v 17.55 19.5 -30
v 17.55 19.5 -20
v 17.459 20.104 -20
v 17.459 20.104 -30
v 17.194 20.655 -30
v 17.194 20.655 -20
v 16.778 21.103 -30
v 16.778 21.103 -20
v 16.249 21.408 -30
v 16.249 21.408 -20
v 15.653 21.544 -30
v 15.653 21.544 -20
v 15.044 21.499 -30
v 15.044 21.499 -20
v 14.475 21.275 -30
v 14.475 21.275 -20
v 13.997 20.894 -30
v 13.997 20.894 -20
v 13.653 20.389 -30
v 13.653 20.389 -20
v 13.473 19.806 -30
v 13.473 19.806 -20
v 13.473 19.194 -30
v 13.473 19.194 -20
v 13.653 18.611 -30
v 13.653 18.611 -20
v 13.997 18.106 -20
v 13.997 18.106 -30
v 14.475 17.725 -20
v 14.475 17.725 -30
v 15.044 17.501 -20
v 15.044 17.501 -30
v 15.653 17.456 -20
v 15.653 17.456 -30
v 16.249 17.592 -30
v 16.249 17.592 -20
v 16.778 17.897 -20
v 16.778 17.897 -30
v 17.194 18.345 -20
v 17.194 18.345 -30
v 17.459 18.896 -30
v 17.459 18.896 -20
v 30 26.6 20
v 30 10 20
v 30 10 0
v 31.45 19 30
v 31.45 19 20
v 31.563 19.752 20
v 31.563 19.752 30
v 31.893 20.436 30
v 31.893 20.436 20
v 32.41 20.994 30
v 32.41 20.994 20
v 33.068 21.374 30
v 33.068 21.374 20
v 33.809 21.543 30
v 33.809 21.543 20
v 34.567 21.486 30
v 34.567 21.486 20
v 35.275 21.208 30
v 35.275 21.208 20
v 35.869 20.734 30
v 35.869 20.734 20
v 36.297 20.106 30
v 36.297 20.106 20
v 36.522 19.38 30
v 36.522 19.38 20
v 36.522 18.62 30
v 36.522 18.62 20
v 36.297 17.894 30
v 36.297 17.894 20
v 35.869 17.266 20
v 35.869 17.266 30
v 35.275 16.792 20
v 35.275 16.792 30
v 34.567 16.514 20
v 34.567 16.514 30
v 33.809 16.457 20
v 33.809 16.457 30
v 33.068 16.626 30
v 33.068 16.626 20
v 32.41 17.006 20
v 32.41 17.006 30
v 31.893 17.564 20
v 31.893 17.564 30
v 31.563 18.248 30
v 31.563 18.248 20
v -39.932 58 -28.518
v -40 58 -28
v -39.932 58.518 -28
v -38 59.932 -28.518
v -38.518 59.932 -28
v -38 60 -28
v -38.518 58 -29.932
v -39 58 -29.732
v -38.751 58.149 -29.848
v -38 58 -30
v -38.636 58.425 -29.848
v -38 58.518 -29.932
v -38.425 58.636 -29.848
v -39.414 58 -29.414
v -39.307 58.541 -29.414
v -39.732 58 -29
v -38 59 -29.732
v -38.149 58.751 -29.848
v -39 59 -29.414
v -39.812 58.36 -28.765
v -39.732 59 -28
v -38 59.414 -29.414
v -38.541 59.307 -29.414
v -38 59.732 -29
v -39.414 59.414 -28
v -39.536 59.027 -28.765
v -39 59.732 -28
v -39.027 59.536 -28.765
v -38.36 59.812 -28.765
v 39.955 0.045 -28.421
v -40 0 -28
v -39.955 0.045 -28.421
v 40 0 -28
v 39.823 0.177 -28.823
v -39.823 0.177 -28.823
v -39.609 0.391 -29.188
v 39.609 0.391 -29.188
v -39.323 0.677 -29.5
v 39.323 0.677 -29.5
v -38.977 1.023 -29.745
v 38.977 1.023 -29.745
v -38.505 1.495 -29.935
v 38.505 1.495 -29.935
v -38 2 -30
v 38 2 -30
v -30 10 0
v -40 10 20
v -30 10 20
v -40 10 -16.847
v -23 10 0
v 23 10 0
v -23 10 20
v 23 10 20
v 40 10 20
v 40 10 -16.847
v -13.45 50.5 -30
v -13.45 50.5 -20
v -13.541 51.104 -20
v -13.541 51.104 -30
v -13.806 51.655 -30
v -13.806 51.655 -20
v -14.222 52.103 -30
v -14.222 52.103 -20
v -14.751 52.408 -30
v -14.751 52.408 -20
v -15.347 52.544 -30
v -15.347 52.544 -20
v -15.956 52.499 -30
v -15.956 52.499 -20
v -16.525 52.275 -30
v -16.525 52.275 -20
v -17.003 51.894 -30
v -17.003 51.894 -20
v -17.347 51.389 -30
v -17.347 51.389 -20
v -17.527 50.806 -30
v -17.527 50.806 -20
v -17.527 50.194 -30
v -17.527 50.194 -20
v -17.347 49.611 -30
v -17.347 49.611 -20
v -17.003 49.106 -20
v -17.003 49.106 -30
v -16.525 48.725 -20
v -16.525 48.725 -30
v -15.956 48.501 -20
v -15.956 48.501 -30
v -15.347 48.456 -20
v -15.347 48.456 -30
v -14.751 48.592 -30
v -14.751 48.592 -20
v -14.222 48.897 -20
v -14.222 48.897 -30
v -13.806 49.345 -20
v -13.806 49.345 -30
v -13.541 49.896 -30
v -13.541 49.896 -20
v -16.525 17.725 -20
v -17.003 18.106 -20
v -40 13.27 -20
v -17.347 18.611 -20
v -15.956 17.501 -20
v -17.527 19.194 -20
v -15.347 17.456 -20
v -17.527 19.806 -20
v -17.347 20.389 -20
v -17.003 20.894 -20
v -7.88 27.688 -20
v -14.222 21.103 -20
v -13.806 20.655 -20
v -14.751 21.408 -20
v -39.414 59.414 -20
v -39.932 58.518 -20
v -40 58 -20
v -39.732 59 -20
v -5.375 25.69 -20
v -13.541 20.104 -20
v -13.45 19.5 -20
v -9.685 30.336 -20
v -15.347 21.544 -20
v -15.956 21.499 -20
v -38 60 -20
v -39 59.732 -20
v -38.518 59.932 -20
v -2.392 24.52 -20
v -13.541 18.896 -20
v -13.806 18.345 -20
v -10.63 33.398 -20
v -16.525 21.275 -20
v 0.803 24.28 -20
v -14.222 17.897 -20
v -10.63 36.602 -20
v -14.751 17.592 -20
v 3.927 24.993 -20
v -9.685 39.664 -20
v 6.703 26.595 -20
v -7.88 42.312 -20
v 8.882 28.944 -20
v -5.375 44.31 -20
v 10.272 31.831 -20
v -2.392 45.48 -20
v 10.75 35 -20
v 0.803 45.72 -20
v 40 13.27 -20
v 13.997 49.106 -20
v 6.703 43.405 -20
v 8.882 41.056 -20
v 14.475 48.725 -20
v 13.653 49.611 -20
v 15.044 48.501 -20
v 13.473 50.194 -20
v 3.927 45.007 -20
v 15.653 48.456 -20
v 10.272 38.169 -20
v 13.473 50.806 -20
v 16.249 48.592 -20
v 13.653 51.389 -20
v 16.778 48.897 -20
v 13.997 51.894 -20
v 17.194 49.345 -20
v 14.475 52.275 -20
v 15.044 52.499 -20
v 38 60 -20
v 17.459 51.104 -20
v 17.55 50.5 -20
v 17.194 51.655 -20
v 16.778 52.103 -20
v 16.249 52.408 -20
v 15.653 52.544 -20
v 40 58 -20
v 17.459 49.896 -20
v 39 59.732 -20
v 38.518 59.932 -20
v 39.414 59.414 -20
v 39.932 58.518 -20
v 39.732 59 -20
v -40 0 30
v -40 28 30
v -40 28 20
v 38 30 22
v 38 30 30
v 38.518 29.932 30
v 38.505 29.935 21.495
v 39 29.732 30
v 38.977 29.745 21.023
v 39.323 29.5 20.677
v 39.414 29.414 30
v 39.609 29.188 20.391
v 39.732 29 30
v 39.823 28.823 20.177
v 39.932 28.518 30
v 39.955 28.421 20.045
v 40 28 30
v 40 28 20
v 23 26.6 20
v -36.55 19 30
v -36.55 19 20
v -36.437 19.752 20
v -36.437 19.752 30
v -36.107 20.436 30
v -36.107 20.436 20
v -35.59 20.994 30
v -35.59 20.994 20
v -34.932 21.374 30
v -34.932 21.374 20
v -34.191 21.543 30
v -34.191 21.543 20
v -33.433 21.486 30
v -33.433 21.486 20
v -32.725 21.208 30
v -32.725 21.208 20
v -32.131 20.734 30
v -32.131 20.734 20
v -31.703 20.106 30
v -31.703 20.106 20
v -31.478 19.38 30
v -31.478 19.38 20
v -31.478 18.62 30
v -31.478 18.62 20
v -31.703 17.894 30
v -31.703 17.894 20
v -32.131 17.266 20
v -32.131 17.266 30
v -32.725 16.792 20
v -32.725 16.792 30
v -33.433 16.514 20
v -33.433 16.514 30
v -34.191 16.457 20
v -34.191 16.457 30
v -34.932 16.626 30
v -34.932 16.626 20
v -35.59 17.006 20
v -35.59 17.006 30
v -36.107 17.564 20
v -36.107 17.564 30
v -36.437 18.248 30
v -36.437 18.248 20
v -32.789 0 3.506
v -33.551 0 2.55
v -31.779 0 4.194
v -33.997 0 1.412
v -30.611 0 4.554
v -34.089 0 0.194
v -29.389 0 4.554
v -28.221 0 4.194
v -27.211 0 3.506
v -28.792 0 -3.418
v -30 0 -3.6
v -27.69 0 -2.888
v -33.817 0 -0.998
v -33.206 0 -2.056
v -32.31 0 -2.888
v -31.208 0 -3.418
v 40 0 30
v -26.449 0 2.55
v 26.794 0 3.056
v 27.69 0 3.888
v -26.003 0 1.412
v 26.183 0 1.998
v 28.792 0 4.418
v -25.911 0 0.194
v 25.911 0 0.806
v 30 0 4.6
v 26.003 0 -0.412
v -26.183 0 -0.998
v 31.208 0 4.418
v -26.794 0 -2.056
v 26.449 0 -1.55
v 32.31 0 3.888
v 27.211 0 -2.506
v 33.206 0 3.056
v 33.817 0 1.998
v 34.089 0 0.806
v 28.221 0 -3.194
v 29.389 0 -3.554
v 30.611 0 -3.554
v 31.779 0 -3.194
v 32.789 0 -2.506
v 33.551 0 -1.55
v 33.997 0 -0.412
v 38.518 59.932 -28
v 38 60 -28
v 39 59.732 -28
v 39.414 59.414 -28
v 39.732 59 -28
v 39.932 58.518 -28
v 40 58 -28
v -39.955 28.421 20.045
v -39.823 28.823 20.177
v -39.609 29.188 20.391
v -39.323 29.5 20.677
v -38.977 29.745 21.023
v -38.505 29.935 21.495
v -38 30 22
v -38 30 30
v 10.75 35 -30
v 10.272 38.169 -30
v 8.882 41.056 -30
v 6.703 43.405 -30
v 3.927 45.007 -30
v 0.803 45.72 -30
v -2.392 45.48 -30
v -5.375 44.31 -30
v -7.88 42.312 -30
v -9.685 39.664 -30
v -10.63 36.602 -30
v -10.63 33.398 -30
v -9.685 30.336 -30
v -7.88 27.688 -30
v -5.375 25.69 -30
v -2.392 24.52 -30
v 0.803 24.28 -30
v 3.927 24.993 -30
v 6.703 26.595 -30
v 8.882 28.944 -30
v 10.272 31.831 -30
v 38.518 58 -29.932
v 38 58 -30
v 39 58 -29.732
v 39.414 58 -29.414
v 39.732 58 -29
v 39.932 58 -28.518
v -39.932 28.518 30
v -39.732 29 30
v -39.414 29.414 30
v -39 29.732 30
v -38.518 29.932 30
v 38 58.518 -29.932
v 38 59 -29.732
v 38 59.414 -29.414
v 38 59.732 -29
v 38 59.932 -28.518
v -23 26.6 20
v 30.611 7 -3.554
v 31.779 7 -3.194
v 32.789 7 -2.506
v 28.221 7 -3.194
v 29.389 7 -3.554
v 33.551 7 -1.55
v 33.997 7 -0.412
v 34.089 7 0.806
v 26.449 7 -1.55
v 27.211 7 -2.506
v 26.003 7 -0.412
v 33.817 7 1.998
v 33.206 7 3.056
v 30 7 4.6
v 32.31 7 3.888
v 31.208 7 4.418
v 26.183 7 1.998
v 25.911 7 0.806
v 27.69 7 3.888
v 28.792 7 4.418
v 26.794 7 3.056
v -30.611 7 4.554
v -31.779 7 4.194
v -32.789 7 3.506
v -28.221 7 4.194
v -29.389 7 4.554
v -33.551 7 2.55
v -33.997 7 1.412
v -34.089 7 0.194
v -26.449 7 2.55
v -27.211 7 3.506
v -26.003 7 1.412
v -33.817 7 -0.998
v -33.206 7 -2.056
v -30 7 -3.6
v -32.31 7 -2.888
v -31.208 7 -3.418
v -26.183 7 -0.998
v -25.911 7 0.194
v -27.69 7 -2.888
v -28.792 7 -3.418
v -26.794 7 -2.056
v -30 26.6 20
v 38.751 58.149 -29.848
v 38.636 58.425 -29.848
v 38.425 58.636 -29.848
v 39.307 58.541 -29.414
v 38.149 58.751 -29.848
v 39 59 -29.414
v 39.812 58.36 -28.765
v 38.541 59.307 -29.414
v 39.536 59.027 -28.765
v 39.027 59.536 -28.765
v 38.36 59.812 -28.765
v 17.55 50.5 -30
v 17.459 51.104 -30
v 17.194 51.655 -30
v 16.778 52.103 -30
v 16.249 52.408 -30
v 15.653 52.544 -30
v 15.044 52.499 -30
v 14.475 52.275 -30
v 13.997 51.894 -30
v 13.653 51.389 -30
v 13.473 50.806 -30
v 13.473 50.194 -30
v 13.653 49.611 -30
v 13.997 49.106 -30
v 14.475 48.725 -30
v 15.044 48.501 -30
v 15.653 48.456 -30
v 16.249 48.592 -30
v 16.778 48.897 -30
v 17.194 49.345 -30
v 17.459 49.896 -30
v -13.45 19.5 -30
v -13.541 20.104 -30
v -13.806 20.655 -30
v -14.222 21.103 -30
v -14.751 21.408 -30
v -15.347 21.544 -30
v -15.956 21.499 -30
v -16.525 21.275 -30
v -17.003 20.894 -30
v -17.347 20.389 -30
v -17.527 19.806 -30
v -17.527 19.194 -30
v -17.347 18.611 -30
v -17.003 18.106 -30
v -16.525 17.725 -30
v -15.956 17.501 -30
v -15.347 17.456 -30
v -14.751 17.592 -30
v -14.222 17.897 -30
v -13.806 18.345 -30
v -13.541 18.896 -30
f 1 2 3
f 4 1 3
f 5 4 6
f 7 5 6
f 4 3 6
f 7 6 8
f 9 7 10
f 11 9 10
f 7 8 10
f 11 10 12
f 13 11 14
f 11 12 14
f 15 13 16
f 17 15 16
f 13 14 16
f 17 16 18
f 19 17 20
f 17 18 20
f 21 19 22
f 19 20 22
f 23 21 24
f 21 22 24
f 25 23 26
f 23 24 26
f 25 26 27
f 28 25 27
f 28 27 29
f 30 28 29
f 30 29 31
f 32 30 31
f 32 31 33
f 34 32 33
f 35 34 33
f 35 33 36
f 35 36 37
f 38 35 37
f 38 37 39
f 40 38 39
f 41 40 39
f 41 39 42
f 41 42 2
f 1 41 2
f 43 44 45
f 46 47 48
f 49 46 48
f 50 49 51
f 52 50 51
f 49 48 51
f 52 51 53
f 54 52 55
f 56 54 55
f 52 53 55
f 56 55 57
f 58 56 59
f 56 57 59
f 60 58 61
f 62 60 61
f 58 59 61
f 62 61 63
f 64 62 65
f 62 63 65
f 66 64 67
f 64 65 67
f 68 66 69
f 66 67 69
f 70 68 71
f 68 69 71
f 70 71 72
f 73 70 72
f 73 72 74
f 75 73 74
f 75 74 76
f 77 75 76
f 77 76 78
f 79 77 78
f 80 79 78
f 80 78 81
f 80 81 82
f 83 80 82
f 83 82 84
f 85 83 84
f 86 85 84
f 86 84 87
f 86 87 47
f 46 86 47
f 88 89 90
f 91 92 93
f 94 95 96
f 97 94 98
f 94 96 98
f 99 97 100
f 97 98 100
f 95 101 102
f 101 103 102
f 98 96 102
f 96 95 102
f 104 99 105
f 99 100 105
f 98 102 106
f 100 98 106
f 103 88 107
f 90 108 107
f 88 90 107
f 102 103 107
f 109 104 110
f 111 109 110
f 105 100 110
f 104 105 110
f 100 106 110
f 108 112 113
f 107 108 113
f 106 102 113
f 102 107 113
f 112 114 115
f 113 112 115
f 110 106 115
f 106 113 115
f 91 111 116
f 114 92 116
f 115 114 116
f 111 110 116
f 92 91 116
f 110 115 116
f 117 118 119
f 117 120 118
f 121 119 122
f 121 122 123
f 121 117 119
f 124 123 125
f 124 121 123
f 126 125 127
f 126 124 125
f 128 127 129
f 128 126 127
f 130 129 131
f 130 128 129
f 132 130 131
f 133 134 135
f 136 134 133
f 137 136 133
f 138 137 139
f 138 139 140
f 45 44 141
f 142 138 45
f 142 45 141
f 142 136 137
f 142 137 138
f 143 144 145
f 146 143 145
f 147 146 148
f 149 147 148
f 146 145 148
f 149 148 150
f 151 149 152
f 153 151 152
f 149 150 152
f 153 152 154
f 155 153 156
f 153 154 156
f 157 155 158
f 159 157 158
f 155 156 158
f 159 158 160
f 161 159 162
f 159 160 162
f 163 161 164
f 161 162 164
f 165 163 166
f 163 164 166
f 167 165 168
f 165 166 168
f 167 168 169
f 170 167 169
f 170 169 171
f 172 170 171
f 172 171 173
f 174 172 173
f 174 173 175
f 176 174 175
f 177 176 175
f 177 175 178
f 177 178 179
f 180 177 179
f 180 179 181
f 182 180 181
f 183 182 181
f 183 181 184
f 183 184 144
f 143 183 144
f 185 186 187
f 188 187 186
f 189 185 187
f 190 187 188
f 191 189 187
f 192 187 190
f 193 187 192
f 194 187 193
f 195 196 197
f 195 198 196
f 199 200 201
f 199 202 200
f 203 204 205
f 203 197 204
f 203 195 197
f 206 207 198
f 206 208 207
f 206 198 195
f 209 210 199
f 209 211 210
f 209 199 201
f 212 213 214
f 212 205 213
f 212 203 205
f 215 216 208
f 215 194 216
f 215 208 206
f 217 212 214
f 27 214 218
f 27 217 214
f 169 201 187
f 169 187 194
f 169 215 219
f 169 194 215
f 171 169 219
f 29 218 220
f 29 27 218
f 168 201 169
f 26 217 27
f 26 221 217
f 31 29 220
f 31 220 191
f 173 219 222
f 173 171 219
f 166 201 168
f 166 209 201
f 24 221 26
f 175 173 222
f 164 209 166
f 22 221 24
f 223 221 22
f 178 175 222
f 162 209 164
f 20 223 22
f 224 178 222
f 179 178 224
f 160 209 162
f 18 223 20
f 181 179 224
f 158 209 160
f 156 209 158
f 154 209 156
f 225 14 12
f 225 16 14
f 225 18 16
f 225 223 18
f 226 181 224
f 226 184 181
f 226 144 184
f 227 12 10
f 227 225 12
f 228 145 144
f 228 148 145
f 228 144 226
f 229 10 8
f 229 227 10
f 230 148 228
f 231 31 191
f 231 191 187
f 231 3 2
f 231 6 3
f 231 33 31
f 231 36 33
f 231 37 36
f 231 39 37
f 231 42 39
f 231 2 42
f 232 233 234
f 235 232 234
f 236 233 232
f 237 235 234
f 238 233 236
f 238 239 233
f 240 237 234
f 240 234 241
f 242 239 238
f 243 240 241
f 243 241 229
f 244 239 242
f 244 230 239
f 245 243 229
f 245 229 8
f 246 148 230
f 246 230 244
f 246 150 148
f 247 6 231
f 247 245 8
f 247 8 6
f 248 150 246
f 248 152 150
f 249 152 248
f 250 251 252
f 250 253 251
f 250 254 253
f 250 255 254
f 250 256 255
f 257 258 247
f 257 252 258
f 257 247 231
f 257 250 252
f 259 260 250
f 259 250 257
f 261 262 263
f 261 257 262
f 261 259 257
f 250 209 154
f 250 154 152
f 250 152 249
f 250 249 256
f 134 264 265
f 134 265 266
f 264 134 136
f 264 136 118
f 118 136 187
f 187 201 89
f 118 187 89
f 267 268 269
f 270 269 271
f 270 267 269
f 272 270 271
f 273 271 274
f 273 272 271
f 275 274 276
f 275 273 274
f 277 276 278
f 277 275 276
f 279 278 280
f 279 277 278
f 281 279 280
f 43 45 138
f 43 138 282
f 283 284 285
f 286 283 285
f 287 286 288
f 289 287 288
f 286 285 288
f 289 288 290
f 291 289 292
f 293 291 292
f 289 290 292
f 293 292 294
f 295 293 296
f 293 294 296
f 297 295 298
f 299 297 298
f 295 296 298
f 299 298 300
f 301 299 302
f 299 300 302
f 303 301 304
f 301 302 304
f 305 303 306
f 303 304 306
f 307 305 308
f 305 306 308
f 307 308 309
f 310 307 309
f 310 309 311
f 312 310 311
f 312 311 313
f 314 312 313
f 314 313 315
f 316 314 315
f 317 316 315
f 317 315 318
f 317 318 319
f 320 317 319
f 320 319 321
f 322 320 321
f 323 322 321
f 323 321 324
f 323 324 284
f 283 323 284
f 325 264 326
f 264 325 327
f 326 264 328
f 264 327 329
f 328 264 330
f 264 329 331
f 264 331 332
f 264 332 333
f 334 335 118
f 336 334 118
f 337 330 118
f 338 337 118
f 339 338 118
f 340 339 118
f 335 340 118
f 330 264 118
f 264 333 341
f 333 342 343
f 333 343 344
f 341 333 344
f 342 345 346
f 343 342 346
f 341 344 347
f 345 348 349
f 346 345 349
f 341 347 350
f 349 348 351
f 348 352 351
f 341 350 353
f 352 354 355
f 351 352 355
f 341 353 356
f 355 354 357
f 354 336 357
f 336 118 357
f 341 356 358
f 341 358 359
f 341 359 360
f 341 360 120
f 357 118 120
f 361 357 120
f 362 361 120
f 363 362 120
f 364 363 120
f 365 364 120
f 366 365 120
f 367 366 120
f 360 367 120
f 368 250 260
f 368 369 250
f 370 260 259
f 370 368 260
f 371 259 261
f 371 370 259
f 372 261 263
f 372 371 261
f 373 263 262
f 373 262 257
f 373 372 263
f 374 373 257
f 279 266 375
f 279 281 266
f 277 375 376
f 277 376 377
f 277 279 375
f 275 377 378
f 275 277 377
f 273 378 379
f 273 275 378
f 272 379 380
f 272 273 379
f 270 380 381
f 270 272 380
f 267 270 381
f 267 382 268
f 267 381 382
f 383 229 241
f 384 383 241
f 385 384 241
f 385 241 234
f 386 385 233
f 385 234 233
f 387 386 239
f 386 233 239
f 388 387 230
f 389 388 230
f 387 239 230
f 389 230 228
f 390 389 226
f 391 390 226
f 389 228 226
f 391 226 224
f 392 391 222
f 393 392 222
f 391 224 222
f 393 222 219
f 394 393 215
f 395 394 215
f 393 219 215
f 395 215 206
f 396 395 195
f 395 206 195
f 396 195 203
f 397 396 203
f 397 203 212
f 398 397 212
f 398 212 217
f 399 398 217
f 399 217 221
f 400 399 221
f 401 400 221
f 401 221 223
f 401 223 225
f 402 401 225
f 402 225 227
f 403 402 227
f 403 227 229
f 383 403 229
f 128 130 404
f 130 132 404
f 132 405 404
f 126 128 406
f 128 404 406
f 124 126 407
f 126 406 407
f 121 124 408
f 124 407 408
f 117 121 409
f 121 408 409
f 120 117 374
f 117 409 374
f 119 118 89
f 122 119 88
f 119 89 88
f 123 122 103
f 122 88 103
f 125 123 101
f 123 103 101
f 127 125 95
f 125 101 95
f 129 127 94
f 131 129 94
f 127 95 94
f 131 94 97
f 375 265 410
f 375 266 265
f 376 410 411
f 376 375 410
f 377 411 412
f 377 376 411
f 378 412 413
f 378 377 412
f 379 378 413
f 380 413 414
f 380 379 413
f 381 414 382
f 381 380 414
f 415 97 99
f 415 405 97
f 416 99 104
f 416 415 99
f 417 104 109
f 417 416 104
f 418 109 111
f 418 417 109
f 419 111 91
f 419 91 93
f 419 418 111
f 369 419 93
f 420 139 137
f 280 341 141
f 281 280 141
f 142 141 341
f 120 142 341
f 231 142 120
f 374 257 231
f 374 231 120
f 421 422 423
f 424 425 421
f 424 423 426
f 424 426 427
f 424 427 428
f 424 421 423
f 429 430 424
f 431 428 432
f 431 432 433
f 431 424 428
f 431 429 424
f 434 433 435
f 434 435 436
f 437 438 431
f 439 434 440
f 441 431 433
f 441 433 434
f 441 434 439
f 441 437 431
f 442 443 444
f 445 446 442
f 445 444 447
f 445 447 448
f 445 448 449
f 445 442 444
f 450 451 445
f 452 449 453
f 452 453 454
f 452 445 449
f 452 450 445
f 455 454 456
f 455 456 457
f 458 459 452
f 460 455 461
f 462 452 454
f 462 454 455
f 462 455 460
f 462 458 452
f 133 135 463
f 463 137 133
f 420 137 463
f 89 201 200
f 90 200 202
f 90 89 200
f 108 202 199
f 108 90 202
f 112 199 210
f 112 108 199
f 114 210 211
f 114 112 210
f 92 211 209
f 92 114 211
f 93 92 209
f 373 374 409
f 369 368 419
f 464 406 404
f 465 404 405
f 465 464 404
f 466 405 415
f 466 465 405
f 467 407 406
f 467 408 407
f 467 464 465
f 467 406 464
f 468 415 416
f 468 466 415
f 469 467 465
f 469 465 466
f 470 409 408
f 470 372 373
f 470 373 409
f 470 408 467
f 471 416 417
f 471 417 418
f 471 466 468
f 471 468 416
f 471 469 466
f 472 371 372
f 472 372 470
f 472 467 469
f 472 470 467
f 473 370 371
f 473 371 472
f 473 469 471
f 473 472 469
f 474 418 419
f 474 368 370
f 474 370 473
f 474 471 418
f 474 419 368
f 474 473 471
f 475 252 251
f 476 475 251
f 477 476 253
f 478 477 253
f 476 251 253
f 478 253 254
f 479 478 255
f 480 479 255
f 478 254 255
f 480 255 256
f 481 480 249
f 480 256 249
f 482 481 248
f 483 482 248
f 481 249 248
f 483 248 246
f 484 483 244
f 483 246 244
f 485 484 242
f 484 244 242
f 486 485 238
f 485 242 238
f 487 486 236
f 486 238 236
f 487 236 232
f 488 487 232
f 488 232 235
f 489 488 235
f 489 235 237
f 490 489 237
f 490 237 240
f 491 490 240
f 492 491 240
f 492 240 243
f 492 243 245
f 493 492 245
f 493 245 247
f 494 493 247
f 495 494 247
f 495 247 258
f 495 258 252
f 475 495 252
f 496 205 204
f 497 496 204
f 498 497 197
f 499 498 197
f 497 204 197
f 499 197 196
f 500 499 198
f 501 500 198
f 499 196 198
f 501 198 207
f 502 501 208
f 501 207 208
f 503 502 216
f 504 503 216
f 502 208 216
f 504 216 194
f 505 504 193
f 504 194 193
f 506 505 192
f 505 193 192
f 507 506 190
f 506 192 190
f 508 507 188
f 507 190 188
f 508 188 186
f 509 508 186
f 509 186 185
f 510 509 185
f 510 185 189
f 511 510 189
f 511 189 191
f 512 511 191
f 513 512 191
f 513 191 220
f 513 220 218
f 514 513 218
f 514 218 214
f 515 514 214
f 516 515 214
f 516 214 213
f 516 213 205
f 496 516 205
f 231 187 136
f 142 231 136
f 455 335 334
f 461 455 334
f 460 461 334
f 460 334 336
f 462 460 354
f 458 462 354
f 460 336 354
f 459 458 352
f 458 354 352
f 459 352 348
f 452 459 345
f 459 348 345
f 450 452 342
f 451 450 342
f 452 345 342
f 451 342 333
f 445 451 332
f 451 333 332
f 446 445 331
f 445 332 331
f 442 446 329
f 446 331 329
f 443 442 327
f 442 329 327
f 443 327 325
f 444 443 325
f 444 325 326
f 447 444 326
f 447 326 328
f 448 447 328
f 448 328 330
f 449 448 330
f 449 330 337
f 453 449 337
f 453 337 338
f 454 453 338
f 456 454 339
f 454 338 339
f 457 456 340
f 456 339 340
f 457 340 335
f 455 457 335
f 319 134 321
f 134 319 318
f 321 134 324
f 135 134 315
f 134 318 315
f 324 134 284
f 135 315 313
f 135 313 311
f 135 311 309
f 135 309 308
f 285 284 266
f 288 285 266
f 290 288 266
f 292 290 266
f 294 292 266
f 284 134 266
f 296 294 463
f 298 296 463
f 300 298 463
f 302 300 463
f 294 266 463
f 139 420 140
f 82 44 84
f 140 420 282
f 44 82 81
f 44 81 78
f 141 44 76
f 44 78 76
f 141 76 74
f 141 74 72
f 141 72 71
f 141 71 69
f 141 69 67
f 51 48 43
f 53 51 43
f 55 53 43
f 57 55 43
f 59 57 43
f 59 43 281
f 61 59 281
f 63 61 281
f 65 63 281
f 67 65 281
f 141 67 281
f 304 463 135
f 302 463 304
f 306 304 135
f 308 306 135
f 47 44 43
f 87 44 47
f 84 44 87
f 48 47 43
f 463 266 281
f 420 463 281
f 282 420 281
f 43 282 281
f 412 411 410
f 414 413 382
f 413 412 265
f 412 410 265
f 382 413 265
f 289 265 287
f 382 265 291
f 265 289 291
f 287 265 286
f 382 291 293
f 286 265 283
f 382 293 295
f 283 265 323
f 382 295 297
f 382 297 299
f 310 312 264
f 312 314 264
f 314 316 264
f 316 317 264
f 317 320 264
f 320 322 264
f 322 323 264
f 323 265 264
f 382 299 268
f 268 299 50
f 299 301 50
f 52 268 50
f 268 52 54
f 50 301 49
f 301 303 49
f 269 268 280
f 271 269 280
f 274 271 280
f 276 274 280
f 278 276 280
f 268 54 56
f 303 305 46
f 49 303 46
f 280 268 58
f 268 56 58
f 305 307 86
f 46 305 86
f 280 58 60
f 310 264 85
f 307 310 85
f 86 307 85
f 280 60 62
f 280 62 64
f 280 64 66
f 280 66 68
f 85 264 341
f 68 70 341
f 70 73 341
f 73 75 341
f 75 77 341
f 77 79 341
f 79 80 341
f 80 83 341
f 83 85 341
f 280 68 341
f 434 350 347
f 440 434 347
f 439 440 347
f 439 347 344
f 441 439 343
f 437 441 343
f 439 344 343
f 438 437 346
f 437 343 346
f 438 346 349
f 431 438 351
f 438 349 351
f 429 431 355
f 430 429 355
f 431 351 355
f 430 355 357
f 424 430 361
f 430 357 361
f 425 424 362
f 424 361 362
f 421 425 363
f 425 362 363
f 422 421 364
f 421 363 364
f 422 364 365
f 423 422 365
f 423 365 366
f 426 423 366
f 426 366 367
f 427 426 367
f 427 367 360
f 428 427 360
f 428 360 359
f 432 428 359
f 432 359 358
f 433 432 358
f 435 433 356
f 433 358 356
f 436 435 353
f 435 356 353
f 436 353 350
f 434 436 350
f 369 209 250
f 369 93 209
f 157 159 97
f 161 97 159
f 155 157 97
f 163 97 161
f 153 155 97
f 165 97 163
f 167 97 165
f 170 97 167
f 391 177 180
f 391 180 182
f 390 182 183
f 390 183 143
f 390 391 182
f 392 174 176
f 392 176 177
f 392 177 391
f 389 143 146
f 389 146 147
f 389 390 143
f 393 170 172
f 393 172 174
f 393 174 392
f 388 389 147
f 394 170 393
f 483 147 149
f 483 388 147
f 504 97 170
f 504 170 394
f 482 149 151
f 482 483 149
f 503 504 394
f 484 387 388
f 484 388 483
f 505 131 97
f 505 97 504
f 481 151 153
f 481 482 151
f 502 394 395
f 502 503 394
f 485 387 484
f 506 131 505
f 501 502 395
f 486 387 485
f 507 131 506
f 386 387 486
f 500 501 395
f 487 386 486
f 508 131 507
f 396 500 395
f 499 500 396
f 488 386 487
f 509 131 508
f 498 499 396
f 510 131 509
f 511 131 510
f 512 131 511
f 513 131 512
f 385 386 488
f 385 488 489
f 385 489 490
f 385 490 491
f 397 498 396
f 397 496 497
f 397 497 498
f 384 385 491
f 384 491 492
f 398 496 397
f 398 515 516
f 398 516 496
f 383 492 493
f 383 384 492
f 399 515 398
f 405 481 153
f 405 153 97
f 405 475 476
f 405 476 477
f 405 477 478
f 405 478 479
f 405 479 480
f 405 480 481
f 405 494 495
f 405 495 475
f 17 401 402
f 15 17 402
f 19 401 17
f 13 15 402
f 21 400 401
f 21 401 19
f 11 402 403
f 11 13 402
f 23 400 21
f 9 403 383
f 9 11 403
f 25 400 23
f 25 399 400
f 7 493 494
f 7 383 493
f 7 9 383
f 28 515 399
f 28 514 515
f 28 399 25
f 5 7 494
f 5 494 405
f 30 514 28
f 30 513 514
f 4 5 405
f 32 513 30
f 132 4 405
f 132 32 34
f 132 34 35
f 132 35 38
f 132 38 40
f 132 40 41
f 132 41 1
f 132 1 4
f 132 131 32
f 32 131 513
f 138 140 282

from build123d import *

# Parameters (mm, degrees)
SKETCH1_W                = 80
SKETCH1_H                = 60
BOSS_EXTRUDE1_DEPTH      = 60
SKETCH2_W                = 95.889864734
SKETCH2_H                = 40
CUT_EXTRUDE1_DEPTH       = 50
SKETCH3_W                = 80
SKETCH3_H                = 10
CUT_EXTRUDE2_DEPTH       = 30
SKETCH5_R                = 4.1
CUT_EXTRUDE3_DEPTH       = 7
SKETCH8_R                = 10.75
CUT_EXTRUDE5_DEPTH       = 88.749643874
SKETCH12_R               = 2.05
CUT_EXTRUDE8_DEPTH       = 88.749643874
FILLET1_R                = 2
SKETCH13_R               = 2.55
CUT_EXTRUDE9_DEPTH       = 88.749643874
SKETCH6_W                = 7
SKETCH6_H                = 16.599779926
BOSS_EXTRUDE2_DEPTH      = 20
CUT_EXTRUDE10_DEPTH      = 97.953597148
CUT_EXTRUDE10_DEPTH_BACK = 97.953597148
BOSS_EXTRUDE3_DEPTH      = 40


with BuildPart() as part:
    # Sketch1 → Boss-Extrude1 (new body)
    with BuildSketch(Plane(origin=(0, 0, 0), x_dir=(1, 0, 0), z_dir=(0, 1, 0))):
        Rectangle(SKETCH1_W, SKETCH1_H)
    extrude(amount=BOSS_EXTRUDE1_DEPTH)

    # Sketch2 → Cut-Extrude1 (cut)
    with BuildSketch(Plane(origin=(0, 60, 0), x_dir=(1, 0, 0), z_dir=(0, 1, 0))):
        Rectangle(SKETCH2_W, SKETCH2_H)
    extrude(amount=-CUT_EXTRUDE1_DEPTH, mode=Mode.SUBTRACT)

    # Sketch3 → Cut-Extrude2 (cut)
    with BuildSketch(Plane(origin=(0, 60, 0), x_dir=(1, 0, 0), z_dir=(0, 1, 0))):
        with Locations((0, -25)):
            Rectangle(SKETCH3_W, SKETCH3_H)
    extrude(amount=-CUT_EXTRUDE2_DEPTH, mode=Mode.SUBTRACT)

    # Sketch5 → Cut-Extrude3 (cut)
    with BuildSketch(Plane.XZ):
        with Locations(Location((-30, 0.5, 0), (0, 0, 270))):
            Circle(SKETCH5_R)
        with Locations(Location((30, 0.5, 0), (0, 0, 90))):
            Circle(SKETCH5_R)
    extrude(amount=-CUT_EXTRUDE3_DEPTH, mode=Mode.SUBTRACT)

    # Sketch8 → Cut-Extrude5 (cut, through all)
    with BuildSketch(Plane.XY.offset(-20)):
        with Locations((0, 35)):
            Circle(SKETCH8_R)
    extrude(amount=-CUT_EXTRUDE5_DEPTH, mode=Mode.SUBTRACT)

    # Sketch12 → Cut-Extrude8 (cut, through all)
    with BuildSketch(Plane.XY.offset(-20)):
        with Locations((15.5, 50.5)):
            Circle(SKETCH12_R)
        with Locations((-15.5, 19.5)):
            Circle(SKETCH12_R)
        with Locations((-15.5, 50.5)):
            Circle(SKETCH12_R)
        with Locations((15.5, 19.5)):
            Circle(SKETCH12_R)
    extrude(amount=-CUT_EXTRUDE8_DEPTH, mode=Mode.SUBTRACT)

    # Fillet1
    fillet1_edges = [part.edges().sort_by_distance(p)[0] for p in [
        (-40, 60, -25),
        (40, 60, -25),
        (-40, 30, 25),
        (0, 30, 20),
        (40, 30, 25),
        (0, 0, -30),
        (-40, 30, -30),
        (40, 30, -30),
        (0, 60, -30),
    ]]
    fillet(fillet1_edges, radius=FILLET1_R)

    # Sketch13 → Cut-Extrude9 (cut, through all)
    with BuildSketch(Plane(origin=(0, 0, 20), x_dir=(-1, 0, 0), z_dir=(0, 0, -1))):
        with Locations((-34, 19)):
            Circle(SKETCH13_R)
        with Locations((34, 19)):
            Circle(SKETCH13_R)
    extrude(amount=-CUT_EXTRUDE9_DEPTH, mode=Mode.SUBTRACT)

    # Sketch6 → Boss-Extrude2 (add)
    with BuildSketch(Plane(origin=(0, 0, 20), x_dir=(-1, 0, 0), z_dir=(0, 0, -1))):
        with Locations((-26.5, 18.299889963)):
            Rectangle(SKETCH6_W, SKETCH6_H)
        with Locations((26.5, 18.299889963)):
            Rectangle(SKETCH6_W, SKETCH6_H)
    extrude(amount=BOSS_EXTRUDE2_DEPTH)

    # Sketch14 → Cut-Extrude10 (cut, two sides: drawn at the far end of the back side and taken through both)
    with BuildSketch(Plane.ZY.offset(30).offset(-CUT_EXTRUDE10_DEPTH_BACK)):
        Polygon((0, 10), (20, 26.599779926), (0, 26.599779926), align=None)
    extrude(amount=CUT_EXTRUDE10_DEPTH + CUT_EXTRUDE10_DEPTH_BACK, mode=Mode.SUBTRACT)

    # Sketch15 → Boss-Extrude3 (add, symmetric)
    with BuildSketch(Plane(origin=(0, 0, 0), x_dir=(0, 0, -1), z_dir=(1, 0, 0))):
        Polygon((20, 13.27), (16.846771097, 10), (20, 10), align=None)
    extrude(amount=BOSS_EXTRUDE3_DEPTH, both=True)


solid = part.part
